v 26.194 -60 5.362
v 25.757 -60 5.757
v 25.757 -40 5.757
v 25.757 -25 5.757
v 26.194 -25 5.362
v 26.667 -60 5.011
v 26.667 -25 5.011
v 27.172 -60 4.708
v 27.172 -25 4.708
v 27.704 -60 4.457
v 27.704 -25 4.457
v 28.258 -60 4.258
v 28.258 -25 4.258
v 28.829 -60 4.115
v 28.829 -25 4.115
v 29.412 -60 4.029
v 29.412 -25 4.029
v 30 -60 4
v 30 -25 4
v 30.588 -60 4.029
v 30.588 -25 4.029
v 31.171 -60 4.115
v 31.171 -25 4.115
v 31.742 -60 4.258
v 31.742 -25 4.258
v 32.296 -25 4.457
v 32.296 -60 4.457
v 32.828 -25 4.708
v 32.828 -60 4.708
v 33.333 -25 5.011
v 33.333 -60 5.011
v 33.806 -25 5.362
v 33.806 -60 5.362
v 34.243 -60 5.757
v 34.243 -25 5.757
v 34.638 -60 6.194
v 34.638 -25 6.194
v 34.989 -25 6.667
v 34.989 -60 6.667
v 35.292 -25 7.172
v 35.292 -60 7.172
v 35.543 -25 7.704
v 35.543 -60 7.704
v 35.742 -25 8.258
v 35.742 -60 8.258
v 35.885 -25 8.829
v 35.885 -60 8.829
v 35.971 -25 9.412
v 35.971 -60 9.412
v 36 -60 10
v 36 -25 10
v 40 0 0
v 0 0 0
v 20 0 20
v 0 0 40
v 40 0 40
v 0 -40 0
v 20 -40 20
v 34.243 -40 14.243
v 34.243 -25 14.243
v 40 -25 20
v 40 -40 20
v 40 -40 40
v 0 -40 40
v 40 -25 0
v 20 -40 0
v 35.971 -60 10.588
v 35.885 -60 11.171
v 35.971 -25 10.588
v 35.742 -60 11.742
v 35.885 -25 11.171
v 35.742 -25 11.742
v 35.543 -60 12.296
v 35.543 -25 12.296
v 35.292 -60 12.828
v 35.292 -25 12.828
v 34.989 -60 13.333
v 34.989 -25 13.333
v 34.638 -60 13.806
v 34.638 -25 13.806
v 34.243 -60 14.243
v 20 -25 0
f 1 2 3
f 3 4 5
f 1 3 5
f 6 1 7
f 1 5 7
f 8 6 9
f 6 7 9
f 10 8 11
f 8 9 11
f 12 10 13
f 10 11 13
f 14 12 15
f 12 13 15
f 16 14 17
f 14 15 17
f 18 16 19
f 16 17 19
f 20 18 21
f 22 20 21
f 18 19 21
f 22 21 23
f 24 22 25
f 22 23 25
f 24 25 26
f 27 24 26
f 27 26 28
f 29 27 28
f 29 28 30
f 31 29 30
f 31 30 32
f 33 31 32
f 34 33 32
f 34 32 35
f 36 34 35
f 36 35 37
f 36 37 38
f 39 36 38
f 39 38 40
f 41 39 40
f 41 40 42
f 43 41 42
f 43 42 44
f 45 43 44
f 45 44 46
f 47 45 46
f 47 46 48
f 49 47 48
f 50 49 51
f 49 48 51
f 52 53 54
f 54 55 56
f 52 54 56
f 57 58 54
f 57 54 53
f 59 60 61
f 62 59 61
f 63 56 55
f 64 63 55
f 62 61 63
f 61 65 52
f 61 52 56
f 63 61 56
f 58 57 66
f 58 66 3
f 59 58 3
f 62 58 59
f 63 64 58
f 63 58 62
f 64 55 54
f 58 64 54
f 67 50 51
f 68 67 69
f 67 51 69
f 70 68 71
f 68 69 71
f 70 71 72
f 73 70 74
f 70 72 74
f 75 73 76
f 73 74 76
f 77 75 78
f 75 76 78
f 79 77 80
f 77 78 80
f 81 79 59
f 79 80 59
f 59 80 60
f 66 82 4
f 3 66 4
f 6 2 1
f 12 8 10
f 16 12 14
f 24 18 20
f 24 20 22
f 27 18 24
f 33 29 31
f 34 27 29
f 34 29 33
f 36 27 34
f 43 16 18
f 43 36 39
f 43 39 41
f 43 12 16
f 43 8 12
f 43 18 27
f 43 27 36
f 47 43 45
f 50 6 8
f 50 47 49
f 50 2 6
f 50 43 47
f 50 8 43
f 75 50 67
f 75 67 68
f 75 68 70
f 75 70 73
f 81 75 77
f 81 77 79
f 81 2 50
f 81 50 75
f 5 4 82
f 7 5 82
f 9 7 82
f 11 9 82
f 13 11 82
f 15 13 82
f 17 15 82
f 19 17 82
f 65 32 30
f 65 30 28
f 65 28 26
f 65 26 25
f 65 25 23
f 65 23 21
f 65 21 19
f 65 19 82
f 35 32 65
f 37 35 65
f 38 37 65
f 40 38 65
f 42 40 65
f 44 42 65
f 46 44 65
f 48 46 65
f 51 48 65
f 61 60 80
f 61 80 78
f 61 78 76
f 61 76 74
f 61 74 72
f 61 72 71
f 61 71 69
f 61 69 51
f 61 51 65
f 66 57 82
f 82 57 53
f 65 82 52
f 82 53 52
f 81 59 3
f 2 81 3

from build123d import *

# Parameters (mm, degrees)
F1_DEPTH = 40
F2_DEPTH = 25
F3_DEPTH = 60


with BuildPart() as f1:
    # F0 (on Front) → F1 (new body)
    with BuildSketch(Plane.XZ):
        with BuildLine():
            Line((20, 20), (0, 0))
            Line((0, 0), (20, 0))
            Line((20, 0), (25.7573593129, 5.7573593129))
            ThreePointArc((25.7573593129, 5.7573593129), (25.7573593129, 14.2426406871), (34.2426406871, 14.2426406871))
            Line((34.2426406871, 14.2426406871), (40, 20))
            Line((40, 20), (40, 40))
            Line((40, 40), (0, 40))
            Line((0, 40), (20, 20))
        make_face()
        with BuildLine():
            ThreePointArc((34.2426406871, 14.2426406871), (25.7573593129, 14.2426406871), (25.7573593129, 5.7573593129))
            Line((25.7573593129, 5.7573593129), (34.2426406871, 14.2426406871))
        make_face()
    extrude(amount=F1_DEPTH)

    # F0 (on Front) → F2 (join)
    with BuildSketch(Plane.XZ):
        with BuildLine():
            Line((25.7573593129, 5.7573593129), (20, 0))
            Line((20, 0), (40, 0))
            Line((40, 0), (40, 20))
            Line((40, 20), (34.2426406871, 14.2426406871))
            ThreePointArc((34.2426406871, 14.2426406871), (35.5432771951, 12.2961005942), (36, 10))
            ThreePointArc((36, 10), (32.2961005942, 4.4567228049), (25.7573593129, 5.7573593129))
        make_face()
    extrude(amount=F2_DEPTH)

    # F0 (on Front) → F3 (join)
    with BuildSketch(Plane.XZ):
        with BuildLine():
            Line((34.2426406871, 14.2426406871), (25.7573593129, 5.7573593129))
            ThreePointArc((25.7573593129, 5.7573593129), (32.2961005942, 4.4567228049), (36, 10))
            ThreePointArc((36, 10), (35.5432771951, 12.2961005942), (34.2426406871, 14.2426406871))
        make_face()
    extrude(amount=F3_DEPTH)


solid = f1.part
